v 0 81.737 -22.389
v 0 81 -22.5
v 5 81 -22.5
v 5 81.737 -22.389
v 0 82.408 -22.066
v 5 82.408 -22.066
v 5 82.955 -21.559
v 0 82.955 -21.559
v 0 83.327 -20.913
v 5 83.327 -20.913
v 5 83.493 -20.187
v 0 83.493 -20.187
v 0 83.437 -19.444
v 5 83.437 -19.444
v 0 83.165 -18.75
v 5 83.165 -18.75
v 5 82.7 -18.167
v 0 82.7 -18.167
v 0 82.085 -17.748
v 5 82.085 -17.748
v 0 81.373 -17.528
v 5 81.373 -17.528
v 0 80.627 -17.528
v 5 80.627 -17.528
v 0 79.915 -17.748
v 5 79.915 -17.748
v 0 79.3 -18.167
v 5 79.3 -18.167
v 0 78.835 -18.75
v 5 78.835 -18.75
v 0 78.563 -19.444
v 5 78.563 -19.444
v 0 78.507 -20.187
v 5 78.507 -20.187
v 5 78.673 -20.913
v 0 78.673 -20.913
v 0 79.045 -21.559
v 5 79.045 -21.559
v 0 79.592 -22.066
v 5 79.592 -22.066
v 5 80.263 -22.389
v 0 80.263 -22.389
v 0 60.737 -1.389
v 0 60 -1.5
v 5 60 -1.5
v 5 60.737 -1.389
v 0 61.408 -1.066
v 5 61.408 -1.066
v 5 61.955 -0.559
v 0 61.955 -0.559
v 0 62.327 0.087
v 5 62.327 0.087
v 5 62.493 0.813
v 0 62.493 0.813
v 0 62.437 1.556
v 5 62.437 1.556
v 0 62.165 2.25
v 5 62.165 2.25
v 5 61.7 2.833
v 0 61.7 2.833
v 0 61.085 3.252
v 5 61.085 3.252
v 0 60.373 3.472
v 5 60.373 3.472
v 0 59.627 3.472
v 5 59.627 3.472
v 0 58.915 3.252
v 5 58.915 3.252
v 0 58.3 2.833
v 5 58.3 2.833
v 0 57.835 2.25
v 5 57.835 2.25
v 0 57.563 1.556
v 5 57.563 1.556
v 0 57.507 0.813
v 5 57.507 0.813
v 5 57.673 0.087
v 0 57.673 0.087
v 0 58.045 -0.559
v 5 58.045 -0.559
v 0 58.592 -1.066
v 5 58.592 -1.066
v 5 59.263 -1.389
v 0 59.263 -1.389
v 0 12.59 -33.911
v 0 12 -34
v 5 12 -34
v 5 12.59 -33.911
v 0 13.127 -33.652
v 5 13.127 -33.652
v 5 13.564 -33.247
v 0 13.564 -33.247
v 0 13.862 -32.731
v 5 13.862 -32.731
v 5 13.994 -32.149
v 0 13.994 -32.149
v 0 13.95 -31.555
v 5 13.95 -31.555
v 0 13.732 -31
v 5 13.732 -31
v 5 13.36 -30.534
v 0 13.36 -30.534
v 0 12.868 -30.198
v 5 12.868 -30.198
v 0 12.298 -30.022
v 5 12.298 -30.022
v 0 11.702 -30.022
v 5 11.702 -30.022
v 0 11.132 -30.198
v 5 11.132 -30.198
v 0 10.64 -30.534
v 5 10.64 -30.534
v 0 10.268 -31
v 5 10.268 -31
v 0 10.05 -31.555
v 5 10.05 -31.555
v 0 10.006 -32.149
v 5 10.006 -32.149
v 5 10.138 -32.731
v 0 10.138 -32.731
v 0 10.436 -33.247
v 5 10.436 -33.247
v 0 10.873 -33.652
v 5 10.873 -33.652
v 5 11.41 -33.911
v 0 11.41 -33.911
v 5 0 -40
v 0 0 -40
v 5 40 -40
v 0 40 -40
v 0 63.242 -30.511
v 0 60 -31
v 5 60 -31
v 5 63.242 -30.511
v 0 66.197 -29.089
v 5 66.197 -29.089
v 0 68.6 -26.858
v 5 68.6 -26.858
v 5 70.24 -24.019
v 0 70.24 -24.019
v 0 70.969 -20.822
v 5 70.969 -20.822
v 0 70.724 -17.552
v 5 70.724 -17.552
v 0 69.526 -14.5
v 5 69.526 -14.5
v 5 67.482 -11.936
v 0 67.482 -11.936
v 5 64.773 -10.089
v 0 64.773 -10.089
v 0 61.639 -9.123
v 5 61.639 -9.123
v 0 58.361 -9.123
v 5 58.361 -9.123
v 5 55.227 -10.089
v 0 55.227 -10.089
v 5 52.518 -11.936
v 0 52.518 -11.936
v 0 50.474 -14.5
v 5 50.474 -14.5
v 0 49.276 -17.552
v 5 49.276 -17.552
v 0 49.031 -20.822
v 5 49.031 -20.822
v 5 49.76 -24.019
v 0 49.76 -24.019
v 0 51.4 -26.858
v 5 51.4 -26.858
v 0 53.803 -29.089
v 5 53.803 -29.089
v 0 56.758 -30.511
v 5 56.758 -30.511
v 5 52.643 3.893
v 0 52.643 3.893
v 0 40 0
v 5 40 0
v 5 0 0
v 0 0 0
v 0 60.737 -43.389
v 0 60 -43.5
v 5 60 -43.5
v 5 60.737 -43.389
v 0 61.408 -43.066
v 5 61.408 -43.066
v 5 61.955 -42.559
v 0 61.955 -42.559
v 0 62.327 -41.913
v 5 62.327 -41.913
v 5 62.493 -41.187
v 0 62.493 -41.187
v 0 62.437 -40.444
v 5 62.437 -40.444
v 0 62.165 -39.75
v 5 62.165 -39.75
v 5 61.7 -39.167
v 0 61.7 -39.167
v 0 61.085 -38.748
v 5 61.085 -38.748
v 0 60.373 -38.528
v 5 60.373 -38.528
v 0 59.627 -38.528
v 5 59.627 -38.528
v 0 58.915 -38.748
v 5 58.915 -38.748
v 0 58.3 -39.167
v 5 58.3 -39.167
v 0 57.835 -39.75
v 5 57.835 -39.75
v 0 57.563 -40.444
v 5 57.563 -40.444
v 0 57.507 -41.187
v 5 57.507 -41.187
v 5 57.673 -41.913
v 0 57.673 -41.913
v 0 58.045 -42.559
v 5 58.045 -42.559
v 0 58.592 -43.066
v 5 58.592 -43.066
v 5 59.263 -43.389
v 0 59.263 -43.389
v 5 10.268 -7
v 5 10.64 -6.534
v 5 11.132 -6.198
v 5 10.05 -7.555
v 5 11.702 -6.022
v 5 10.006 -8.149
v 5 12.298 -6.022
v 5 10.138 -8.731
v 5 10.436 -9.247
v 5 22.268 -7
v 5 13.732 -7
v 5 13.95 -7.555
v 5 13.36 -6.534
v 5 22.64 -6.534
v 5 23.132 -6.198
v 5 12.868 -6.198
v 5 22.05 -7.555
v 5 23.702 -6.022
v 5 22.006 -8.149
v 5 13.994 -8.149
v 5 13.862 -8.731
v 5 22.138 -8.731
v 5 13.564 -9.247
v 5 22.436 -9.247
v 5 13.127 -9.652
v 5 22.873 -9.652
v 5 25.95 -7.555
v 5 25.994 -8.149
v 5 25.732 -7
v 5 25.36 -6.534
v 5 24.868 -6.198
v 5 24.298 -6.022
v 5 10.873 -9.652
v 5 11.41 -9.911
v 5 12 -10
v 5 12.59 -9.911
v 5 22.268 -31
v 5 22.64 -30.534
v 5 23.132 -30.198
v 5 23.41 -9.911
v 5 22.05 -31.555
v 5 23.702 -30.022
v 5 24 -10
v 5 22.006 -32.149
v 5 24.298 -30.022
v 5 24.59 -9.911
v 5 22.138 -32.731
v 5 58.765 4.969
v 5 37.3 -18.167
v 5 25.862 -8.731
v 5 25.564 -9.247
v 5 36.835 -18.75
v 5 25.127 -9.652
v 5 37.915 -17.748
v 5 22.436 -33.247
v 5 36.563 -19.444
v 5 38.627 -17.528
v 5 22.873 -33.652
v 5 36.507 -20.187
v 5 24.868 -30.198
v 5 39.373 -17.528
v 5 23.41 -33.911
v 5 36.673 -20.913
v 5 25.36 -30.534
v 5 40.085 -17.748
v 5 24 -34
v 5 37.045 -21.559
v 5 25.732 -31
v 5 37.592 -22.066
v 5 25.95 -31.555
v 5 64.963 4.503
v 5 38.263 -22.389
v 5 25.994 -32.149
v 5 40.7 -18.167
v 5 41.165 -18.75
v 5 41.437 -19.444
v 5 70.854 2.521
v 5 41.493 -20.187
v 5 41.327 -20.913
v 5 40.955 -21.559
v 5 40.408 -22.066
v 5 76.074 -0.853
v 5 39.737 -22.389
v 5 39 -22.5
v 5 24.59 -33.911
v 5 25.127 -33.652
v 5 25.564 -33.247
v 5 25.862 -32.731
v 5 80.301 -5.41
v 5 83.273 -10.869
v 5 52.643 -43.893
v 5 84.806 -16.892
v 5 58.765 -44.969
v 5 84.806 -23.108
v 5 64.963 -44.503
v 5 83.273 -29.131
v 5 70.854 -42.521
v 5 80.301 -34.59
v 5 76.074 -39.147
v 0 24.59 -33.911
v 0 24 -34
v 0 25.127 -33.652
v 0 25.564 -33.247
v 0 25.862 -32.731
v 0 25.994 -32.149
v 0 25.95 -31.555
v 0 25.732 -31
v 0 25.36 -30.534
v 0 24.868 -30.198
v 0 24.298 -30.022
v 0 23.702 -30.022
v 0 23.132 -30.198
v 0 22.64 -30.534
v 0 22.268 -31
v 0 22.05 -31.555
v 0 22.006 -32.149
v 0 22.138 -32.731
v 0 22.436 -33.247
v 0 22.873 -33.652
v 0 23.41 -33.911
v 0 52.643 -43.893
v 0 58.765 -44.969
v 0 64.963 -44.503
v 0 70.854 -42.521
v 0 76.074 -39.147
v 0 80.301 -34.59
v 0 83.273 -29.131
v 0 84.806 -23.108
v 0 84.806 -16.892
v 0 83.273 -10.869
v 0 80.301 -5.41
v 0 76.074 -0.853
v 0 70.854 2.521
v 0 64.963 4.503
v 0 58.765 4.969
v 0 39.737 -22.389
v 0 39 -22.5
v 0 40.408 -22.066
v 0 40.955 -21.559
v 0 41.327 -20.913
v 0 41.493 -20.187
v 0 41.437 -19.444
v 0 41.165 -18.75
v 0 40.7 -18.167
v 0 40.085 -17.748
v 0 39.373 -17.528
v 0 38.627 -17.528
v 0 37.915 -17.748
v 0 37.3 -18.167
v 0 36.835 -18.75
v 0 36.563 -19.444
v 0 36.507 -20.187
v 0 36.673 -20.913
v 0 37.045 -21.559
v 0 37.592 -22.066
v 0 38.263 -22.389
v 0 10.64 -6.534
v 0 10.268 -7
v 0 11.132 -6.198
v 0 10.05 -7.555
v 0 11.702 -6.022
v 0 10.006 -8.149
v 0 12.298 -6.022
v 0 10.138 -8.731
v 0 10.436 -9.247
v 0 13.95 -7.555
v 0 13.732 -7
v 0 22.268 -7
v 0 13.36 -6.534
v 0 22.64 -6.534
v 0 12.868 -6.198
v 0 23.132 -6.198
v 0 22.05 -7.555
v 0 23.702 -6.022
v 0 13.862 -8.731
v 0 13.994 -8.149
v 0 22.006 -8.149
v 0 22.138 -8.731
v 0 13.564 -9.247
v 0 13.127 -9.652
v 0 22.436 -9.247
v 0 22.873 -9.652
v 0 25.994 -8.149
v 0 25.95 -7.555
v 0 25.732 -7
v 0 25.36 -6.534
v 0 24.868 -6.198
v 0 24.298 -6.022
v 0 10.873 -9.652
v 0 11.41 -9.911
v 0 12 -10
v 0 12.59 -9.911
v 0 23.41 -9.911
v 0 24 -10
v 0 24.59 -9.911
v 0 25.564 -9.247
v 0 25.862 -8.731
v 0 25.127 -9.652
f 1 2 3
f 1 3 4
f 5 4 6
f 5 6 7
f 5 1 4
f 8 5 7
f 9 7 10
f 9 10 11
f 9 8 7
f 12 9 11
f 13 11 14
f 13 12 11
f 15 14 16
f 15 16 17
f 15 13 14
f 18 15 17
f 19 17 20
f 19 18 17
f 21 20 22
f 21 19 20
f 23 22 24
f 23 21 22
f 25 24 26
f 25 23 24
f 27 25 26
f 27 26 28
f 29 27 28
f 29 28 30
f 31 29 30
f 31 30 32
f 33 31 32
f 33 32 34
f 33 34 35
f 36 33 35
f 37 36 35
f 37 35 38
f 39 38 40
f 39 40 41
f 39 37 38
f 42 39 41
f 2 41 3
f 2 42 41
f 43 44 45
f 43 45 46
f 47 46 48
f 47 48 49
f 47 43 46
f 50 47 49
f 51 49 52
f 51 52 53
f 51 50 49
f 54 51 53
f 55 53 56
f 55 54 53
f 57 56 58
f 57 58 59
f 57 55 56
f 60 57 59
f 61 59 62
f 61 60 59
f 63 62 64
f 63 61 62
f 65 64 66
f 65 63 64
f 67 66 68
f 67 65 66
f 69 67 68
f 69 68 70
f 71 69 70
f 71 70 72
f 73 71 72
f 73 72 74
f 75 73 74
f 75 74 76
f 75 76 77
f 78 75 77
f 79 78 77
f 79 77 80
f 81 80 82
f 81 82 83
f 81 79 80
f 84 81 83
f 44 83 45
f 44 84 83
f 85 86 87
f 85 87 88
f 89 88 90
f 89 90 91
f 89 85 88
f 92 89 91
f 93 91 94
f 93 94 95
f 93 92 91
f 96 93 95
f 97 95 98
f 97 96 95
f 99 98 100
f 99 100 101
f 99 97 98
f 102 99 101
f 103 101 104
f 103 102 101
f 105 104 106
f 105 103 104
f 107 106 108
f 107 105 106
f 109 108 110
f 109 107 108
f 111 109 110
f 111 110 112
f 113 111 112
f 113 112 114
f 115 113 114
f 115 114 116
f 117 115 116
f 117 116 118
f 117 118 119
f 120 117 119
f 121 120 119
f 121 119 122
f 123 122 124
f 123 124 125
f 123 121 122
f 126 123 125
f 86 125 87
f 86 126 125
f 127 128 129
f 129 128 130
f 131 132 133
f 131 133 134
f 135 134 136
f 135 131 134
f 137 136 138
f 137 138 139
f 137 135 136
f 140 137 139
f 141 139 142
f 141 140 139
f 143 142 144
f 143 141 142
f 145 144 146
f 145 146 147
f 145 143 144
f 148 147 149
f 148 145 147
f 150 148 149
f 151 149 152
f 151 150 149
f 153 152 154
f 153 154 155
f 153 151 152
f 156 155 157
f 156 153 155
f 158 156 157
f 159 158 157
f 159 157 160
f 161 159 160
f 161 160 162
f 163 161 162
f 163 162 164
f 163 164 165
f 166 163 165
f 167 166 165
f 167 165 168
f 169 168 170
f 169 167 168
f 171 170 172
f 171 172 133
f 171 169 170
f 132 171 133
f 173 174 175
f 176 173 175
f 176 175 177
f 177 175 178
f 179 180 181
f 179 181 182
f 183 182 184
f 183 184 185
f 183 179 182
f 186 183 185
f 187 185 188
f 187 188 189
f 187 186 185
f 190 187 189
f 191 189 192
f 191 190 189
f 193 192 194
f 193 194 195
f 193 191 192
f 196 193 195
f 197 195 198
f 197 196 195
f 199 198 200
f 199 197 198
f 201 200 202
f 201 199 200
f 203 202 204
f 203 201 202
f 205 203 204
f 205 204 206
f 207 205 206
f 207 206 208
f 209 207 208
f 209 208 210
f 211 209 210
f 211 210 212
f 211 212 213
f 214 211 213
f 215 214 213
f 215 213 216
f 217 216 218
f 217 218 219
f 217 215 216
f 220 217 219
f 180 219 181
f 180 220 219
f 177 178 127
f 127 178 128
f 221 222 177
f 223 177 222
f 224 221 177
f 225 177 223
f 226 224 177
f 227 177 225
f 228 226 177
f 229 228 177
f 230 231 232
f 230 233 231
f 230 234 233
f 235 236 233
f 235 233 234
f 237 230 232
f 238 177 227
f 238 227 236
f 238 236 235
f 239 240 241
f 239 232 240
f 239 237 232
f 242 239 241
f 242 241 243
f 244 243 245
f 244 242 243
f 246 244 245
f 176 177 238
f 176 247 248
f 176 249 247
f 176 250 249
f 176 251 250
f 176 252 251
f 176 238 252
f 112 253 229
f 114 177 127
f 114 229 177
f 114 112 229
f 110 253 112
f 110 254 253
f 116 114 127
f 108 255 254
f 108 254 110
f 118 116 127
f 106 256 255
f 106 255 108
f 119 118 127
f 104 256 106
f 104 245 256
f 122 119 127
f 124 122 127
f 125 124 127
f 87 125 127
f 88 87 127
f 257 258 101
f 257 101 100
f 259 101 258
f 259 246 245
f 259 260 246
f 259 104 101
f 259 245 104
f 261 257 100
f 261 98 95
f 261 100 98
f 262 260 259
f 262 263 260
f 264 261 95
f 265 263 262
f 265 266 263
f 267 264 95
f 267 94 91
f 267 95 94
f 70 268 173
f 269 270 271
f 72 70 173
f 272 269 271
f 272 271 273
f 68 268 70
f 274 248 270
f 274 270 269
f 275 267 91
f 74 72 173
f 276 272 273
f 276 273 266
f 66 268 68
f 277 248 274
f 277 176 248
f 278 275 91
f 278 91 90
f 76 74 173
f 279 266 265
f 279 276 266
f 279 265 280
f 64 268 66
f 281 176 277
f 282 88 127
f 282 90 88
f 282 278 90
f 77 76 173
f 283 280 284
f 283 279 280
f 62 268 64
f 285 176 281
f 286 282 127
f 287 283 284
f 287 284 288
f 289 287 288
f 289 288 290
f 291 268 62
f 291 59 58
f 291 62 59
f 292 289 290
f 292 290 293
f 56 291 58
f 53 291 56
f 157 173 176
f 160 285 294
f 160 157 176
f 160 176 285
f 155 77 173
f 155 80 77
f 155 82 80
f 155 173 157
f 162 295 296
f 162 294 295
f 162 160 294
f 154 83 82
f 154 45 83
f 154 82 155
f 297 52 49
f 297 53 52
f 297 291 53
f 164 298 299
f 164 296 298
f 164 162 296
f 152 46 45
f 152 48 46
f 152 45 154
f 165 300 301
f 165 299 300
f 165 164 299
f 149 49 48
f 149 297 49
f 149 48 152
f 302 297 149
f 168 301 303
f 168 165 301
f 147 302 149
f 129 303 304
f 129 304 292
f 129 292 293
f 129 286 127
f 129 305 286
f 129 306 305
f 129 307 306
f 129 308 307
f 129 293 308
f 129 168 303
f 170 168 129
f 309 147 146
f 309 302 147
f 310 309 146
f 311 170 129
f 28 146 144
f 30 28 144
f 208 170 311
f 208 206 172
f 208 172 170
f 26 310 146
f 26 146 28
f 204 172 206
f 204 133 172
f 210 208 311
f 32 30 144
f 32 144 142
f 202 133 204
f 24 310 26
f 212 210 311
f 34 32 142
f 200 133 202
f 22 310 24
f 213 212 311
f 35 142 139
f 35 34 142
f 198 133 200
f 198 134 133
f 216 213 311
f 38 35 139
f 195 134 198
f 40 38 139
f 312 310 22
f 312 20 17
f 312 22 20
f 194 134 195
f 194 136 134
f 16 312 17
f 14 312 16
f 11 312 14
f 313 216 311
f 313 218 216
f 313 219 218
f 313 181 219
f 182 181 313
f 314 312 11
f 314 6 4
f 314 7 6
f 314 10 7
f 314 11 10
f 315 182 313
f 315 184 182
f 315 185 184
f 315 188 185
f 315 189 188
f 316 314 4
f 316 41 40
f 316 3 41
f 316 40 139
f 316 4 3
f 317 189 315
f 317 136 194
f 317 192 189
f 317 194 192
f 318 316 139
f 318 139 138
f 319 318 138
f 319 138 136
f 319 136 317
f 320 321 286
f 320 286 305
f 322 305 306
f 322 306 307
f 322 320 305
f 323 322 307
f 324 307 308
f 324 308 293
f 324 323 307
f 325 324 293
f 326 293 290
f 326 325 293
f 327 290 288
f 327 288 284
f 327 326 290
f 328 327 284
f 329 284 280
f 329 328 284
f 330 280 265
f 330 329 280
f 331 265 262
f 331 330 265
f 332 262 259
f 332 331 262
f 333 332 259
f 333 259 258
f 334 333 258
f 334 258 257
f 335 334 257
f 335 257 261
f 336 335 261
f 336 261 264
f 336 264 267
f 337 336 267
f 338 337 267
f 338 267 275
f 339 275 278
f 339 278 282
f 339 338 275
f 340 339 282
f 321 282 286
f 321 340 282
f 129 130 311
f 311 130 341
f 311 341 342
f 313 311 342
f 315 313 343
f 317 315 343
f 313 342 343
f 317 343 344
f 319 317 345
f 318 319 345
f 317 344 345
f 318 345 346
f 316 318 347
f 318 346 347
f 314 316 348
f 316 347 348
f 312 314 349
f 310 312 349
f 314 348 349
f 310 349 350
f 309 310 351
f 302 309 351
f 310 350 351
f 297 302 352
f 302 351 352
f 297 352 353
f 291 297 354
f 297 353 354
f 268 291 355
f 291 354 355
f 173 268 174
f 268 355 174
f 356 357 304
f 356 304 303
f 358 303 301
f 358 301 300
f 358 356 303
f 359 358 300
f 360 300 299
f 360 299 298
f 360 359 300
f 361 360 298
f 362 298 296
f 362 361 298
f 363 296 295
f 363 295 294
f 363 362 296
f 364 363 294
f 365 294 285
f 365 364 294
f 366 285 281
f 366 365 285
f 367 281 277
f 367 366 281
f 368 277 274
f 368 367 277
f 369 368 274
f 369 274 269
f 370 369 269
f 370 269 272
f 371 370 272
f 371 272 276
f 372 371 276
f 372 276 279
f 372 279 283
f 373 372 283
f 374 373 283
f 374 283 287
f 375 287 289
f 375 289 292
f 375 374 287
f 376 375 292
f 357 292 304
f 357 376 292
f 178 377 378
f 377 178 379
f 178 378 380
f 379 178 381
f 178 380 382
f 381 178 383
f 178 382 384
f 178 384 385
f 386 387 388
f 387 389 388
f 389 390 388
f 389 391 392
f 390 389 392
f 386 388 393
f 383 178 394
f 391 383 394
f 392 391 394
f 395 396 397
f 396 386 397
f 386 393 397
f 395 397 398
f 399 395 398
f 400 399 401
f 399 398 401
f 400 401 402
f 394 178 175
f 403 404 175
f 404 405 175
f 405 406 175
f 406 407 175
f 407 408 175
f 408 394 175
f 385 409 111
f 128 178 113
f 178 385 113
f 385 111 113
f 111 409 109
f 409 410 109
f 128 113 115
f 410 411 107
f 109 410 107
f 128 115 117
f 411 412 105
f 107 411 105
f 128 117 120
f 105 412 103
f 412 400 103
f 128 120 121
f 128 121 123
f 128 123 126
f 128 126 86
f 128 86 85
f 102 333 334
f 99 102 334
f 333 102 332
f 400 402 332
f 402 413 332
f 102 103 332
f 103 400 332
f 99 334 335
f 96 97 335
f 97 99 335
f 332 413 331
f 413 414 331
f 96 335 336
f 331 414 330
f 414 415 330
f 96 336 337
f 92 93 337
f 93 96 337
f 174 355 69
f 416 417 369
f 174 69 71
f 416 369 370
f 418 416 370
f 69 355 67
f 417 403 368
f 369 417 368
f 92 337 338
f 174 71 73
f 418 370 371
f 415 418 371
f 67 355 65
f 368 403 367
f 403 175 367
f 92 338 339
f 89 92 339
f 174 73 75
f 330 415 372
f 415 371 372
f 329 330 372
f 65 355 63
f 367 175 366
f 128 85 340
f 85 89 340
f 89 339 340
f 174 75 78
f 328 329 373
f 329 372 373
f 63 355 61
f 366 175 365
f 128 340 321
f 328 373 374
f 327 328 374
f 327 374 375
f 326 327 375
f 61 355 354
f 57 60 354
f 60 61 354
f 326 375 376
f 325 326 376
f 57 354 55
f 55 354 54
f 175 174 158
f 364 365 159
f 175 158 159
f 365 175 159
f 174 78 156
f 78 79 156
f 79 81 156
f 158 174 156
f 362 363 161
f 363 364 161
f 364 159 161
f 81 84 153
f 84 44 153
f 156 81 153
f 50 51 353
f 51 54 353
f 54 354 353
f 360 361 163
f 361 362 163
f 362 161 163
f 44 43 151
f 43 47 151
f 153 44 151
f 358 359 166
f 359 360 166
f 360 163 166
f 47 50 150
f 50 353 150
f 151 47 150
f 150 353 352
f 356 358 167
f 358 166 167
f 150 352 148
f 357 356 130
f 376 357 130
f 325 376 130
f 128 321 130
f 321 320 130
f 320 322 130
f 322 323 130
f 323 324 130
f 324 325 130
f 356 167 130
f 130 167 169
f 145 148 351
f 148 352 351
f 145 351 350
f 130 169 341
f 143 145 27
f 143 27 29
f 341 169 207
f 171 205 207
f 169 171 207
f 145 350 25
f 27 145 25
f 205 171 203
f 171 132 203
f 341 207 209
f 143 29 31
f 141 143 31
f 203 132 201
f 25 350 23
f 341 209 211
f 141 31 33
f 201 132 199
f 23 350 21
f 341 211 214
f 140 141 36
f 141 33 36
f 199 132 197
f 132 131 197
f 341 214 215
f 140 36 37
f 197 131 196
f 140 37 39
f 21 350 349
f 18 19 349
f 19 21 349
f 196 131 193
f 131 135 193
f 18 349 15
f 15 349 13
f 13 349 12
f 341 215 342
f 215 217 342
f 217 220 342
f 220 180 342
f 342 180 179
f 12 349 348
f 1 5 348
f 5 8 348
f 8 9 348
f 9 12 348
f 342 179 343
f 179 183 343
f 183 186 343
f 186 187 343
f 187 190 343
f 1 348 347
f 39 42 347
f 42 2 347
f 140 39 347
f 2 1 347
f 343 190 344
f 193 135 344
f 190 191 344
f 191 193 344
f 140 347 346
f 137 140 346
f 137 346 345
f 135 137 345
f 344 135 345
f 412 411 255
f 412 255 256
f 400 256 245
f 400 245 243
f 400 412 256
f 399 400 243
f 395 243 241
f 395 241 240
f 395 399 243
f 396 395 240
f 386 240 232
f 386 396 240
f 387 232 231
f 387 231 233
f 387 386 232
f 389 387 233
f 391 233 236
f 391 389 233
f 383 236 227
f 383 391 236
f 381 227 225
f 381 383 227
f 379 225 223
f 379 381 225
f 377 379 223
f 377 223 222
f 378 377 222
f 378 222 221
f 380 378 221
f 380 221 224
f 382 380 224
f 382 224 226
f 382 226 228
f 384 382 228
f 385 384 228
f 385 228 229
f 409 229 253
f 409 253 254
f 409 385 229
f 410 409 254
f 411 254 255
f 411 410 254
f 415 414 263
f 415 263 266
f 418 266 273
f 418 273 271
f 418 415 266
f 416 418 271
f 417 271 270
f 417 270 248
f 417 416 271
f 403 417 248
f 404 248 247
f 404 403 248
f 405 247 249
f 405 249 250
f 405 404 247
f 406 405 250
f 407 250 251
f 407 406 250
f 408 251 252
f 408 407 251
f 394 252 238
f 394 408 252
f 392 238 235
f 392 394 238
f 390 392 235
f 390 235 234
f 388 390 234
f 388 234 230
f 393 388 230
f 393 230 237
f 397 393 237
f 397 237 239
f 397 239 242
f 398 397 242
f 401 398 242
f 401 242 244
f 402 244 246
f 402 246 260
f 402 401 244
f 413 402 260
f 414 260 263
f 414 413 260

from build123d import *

# Parameters (mm, degrees)
CROQUIS1_R              = 2
CROQUIS1_R_2            = 2.5
CROQUIS1_R_3            = 11
SALIENTE_EXTRUIR1_DEPTH = 5


with BuildPart() as part:
    # Croquis1 → Saliente-Extruir1 (new body)
    with BuildSketch(Plane(origin=(0, 0, 0), x_dir=(0, 0, -1), z_dir=(1, 0, 0))):
        with BuildLine():
            ThreePointArc((43.892972847, 52.642972847), (20, 85), (-3.892972847, 52.642972847))
            Line((-3.892972847, 52.642972847), (0, 40))
            Line((0, 40), (0, 0))
            Line((0, 0), (40, 0))
            Line((40, 0), (40, 40))
            Line((40, 40), (43.892972847, 52.642972847))
        make_face()
        with Locations((8, 12)):
            Circle(CROQUIS1_R, mode=Mode.SUBTRACT)
        with Locations((8, 24)):
            Circle(CROQUIS1_R, mode=Mode.SUBTRACT)
        with Locations((20, 39)):
            Circle(CROQUIS1_R_2, mode=Mode.SUBTRACT)
        with Locations((32, 12)):
            Circle(CROQUIS1_R, mode=Mode.SUBTRACT)
        with Locations((32, 24)):
            Circle(CROQUIS1_R, mode=Mode.SUBTRACT)
        with Locations((-1, 60)):
            Circle(CROQUIS1_R_2, mode=Mode.SUBTRACT)
        with Locations((20, 60)):
            Circle(CROQUIS1_R_3, mode=Mode.SUBTRACT)
        with Locations((20, 81)):
            Circle(CROQUIS1_R_2, mode=Mode.SUBTRACT)
        with Locations((41, 60)):
            Circle(CROQUIS1_R_2, mode=Mode.SUBTRACT)
    extrude(amount=SALIENTE_EXTRUIR1_DEPTH)


solid = part.part
